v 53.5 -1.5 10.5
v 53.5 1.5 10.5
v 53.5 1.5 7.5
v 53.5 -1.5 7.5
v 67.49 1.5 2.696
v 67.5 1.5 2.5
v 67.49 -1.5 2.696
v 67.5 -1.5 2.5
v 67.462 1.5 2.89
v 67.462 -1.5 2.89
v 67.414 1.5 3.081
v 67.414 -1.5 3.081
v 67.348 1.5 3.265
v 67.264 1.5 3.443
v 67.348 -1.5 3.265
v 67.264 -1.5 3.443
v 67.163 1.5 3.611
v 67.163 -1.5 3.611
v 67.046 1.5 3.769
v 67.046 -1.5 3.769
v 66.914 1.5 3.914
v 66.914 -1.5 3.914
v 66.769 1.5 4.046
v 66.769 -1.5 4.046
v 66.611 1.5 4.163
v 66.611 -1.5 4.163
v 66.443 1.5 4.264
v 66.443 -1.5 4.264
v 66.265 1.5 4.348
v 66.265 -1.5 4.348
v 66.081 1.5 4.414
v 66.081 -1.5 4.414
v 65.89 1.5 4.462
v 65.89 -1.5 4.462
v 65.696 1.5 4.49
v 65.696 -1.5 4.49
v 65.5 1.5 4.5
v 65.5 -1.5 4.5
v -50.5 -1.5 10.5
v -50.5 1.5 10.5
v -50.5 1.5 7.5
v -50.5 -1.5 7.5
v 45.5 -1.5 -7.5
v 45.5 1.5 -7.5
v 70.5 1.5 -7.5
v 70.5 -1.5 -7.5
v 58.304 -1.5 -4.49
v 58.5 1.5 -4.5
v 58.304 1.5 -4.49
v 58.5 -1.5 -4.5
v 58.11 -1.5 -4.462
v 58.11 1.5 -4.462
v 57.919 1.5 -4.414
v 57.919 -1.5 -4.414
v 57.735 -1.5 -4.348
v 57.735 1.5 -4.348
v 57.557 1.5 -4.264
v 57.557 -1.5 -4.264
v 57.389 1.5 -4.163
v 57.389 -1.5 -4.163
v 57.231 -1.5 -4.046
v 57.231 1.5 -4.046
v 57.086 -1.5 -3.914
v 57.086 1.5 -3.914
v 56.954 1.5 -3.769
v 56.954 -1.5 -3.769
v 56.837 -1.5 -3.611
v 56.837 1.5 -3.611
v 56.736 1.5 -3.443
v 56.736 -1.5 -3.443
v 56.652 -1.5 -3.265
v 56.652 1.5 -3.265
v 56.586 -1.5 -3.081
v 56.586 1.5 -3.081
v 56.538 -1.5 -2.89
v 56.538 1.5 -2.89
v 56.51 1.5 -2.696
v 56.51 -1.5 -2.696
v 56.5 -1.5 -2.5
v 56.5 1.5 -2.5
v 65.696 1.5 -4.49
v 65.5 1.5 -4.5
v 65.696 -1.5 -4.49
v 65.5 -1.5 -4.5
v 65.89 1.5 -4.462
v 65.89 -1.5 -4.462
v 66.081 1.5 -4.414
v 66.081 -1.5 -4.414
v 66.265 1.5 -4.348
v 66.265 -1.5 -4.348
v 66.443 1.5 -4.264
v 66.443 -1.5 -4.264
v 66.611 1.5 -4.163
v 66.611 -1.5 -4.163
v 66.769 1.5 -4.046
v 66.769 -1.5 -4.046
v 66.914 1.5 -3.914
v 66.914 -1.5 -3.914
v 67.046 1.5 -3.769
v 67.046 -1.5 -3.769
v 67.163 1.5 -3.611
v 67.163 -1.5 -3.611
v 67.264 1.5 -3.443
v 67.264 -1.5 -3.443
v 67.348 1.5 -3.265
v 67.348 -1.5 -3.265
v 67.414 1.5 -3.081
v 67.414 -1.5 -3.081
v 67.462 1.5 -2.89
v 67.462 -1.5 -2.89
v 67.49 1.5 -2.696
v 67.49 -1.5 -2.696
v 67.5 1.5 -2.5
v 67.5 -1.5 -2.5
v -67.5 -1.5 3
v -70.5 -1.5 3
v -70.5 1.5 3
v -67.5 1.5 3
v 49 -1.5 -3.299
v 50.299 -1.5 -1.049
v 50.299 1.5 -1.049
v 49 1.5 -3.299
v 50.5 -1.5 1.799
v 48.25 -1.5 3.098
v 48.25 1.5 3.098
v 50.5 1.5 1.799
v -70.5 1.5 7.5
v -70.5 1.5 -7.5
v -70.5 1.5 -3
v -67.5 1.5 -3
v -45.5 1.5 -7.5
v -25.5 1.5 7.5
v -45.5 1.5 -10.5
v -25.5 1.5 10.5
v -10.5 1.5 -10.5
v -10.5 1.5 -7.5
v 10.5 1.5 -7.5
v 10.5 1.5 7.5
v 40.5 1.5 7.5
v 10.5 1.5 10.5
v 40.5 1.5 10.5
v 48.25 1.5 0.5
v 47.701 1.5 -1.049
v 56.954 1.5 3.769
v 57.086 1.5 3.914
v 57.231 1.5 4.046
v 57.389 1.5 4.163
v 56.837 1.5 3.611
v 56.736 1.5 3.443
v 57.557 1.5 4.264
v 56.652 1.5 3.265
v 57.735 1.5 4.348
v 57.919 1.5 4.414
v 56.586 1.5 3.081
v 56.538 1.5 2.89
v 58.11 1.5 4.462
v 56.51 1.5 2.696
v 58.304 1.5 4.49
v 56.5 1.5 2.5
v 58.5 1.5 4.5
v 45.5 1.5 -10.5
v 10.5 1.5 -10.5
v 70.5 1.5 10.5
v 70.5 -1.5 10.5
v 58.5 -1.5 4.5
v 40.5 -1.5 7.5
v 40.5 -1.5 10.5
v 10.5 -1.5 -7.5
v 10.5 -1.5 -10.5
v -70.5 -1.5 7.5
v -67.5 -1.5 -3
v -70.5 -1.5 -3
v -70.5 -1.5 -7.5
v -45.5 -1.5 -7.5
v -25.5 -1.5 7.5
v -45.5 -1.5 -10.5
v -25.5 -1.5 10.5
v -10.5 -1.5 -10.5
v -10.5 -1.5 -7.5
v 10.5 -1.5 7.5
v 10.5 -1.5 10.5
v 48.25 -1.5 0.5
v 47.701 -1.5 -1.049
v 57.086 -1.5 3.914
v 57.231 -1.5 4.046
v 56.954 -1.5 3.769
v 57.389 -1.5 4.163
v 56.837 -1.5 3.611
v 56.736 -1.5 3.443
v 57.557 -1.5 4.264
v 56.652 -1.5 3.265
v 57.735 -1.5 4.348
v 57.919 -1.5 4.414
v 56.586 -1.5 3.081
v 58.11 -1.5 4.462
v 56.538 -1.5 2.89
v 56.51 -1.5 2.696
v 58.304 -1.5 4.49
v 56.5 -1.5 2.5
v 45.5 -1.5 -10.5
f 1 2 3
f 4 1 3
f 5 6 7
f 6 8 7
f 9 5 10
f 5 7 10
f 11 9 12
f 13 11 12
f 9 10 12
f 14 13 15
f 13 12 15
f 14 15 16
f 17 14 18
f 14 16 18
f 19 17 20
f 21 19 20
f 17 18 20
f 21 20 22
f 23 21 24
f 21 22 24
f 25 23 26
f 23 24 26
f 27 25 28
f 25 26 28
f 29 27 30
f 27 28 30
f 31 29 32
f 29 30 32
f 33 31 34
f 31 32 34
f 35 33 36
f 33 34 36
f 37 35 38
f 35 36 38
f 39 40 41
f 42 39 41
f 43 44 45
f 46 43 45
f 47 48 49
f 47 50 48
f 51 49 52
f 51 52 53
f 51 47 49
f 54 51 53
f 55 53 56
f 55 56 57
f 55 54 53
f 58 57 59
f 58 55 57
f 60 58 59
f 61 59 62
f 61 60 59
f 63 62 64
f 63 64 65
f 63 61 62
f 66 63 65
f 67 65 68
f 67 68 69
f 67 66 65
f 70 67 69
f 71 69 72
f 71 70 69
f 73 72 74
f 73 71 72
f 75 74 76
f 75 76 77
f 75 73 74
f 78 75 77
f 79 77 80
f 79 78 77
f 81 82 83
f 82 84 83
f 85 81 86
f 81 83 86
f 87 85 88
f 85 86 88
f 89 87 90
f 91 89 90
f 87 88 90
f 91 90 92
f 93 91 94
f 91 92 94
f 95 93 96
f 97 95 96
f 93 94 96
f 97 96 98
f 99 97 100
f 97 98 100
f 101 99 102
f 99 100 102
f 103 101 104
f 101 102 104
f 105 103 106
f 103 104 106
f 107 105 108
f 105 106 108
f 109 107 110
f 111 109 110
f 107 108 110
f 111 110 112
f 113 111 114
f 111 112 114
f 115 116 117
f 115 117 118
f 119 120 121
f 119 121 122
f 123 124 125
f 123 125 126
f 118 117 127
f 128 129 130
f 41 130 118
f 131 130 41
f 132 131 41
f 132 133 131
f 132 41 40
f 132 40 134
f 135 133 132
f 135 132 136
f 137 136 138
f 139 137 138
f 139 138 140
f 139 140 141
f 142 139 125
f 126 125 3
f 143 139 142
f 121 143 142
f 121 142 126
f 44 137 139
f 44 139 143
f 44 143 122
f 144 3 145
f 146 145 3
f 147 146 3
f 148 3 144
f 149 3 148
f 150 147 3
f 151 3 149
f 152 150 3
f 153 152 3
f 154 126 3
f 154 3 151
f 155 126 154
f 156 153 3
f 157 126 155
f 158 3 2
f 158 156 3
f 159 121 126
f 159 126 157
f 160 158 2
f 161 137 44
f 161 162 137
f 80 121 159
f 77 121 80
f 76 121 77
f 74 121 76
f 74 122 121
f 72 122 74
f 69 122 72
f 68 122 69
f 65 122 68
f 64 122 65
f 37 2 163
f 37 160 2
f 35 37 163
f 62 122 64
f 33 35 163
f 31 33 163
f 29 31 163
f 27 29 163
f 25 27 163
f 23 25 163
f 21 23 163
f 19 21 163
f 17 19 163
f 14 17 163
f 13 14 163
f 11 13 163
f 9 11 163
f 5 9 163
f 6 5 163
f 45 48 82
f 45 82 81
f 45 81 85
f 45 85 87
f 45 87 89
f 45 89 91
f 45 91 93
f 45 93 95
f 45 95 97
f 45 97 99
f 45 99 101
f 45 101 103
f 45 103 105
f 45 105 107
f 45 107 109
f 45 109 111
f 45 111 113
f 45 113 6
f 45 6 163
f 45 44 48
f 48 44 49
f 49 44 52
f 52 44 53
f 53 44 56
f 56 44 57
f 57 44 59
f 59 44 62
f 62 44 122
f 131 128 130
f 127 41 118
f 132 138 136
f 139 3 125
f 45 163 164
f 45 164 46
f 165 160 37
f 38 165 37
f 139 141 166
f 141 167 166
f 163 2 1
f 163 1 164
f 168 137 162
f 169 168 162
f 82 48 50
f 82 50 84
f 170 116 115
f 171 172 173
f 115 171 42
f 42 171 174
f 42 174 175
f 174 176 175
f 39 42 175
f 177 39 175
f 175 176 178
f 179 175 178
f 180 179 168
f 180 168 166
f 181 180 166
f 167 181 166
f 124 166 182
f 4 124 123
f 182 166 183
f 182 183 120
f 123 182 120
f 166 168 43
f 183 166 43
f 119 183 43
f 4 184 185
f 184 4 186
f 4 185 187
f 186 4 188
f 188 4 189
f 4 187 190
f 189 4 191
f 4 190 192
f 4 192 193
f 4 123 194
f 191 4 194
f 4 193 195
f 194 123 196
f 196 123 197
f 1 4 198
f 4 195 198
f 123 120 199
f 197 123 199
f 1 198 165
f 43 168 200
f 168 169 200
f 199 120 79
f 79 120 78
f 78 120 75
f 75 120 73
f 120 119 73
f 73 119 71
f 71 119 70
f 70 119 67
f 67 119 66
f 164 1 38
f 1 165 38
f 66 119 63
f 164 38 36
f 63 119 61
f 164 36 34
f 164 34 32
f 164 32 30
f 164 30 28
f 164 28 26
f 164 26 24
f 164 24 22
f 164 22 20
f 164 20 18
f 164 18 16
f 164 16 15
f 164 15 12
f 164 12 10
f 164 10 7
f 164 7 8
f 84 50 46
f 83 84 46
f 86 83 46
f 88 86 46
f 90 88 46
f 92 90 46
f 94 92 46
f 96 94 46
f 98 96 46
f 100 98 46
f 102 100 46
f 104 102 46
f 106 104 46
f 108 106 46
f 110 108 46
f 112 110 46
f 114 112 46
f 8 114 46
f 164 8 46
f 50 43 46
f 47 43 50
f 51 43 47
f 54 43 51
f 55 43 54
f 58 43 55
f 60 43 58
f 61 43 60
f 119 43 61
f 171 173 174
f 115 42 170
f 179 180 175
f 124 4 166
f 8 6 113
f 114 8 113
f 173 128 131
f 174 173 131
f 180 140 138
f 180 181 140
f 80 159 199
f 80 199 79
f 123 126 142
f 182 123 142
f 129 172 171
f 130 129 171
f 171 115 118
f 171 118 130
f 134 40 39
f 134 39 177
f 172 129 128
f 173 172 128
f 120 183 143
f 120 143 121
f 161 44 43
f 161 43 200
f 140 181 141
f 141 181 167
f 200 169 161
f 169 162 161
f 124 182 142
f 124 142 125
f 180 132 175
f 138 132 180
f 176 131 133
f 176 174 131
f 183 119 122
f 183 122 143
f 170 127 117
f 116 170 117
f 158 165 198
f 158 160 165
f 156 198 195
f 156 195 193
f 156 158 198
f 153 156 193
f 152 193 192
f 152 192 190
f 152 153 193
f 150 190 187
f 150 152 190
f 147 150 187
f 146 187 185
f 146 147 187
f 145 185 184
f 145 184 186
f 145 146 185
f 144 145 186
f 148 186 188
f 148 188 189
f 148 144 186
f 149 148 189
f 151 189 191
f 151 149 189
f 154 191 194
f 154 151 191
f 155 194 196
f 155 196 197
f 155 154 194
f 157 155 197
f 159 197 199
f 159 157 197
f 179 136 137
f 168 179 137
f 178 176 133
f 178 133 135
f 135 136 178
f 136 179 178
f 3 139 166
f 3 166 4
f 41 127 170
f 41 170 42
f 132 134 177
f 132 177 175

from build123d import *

# Parameters (mm, degrees)
SKETCH1_W                = 141
SKETCH1_H                = 15
BOSS_EXTRUDE1_DEPTH      = 1.5
SKETCH2_W                = 30
SKETCH2_H                = 3
SKETCH2_W_2              = 17
BOSS_EXTRUDE2_DEPTH      = 1.5
SKETCH12_W               = 25
SKETCH12_H               = 3
BOSS_EXTRUDE3_DEPTH      = 1.5
SKETCH13_W               = 35
SKETCH13_H               = 3
BOSS_EXTRUDE4_DEPTH      = 1.5
SKETCH15_W               = 11
SKETCH15_H               = 9
CUT_EXTRUDE10_DEPTH      = 2.5
CUT_EXTRUDE10_DEPTH_BACK = 2.5
FILLET4_R                = 2
CUT_EXTRUDE11_DEPTH      = 2.5
CUT_EXTRUDE11_DEPTH_BACK = 2.5
SKETCH17_W               = 3
SKETCH17_H               = 6
CUT_EXTRUDE12_DEPTH      = 2.5
CUT_EXTRUDE12_DEPTH_BACK = 2.5


with BuildPart() as part:
    # Sketch1 → Boss-Extrude1 (new body, symmetric)
    with BuildSketch(Plane(origin=(0, 0, 0), x_dir=(1, 0, 0), z_dir=(0, 1, 0))):
        Rectangle(SKETCH1_W, SKETCH1_H)
    extrude(amount=BOSS_EXTRUDE1_DEPTH, both=True)

    # Sketch2 → Boss-Extrude2 (add, symmetric)
    with BuildSketch(Plane(origin=(0, 0, 0), x_dir=(1, 0, 0), z_dir=(0, 1, 0))):
        with Locations((25.5, -9)):
            Rectangle(SKETCH2_W, SKETCH2_H)
        with Locations((62, -9)):
            Rectangle(SKETCH2_W_2, SKETCH2_H)
    extrude(amount=BOSS_EXTRUDE2_DEPTH, both=True)

    # Sketch12 → Boss-Extrude3 (add, symmetric)
    with BuildSketch(Plane(origin=(0, 0, 0), x_dir=(1, 0, 0), z_dir=(0, 1, 0))):
        with Locations((-38, -9)):
            Rectangle(SKETCH12_W, SKETCH12_H)
    extrude(amount=BOSS_EXTRUDE3_DEPTH, both=True)

    # Sketch13 → Boss-Extrude4 (add, symmetric)
    with BuildSketch(Plane(origin=(0, 0, 0), x_dir=(1, 0, 0), z_dir=(0, 1, 0))):
        with Locations((-28, 9)):
            Rectangle(SKETCH13_W, SKETCH13_H)
        with Locations((28, 9)):
            Rectangle(SKETCH13_W, SKETCH13_H)
    extrude(amount=BOSS_EXTRUDE4_DEPTH, both=True)

    # Sketch15 → Cut-Extrude10 (cut, two sides)
    with BuildSketch(Plane(origin=(0, 0, 0), x_dir=(1, 0, 0), z_dir=(0, 1, 0))) as cut_extrude10_sk:
        with Locations((62, 0)):
            Rectangle(SKETCH15_W, SKETCH15_H)
    extrude(amount=CUT_EXTRUDE10_DEPTH, mode=Mode.SUBTRACT)
    extrude(cut_extrude10_sk.sketch, amount=-CUT_EXTRUDE10_DEPTH_BACK, mode=Mode.SUBTRACT)

    # Fillet4
    fillet4_edges = [part.edges().sort_by_distance(p)[0] for p in [
        (56.5, 0, 4.5),
        (56.5, 0, -4.5),
        (67.5, 0, -4.5),
        (67.5, 0, 4.5),
    ]]
    fillet(fillet4_edges, radius=FILLET4_R)

    # Sketch16 → Cut-Extrude11 (cut, two sides)
    with BuildSketch(Plane(origin=(0, 0, 0), x_dir=(1, 0, 0), z_dir=(0, 1, 0))) as cut_extrude11_sk:
        Polygon((49, 3.299038106), (47.700961894, 1.049038106), (50.299038106, 1.049038106), align=None)
        Polygon((50.5, -1.799038106), (48.25, -0.5), (48.25, -3.098076211), align=None)
    extrude(amount=CUT_EXTRUDE11_DEPTH, mode=Mode.SUBTRACT)
    extrude(cut_extrude11_sk.sketch, amount=-CUT_EXTRUDE11_DEPTH_BACK, mode=Mode.SUBTRACT)

    # Sketch17 → Cut-Extrude12 (cut, two sides)
    with BuildSketch(Plane(origin=(0, 0, 0), x_dir=(1, 0, 0), z_dir=(0, 1, 0))) as cut_extrude12_sk:
        with Locations((-69, 0)):
            Rectangle(SKETCH17_W, SKETCH17_H)
    extrude(amount=CUT_EXTRUDE12_DEPTH, mode=Mode.SUBTRACT)
    extrude(cut_extrude12_sk.sketch, amount=-CUT_EXTRUDE12_DEPTH_BACK, mode=Mode.SUBTRACT)


solid = part.part
